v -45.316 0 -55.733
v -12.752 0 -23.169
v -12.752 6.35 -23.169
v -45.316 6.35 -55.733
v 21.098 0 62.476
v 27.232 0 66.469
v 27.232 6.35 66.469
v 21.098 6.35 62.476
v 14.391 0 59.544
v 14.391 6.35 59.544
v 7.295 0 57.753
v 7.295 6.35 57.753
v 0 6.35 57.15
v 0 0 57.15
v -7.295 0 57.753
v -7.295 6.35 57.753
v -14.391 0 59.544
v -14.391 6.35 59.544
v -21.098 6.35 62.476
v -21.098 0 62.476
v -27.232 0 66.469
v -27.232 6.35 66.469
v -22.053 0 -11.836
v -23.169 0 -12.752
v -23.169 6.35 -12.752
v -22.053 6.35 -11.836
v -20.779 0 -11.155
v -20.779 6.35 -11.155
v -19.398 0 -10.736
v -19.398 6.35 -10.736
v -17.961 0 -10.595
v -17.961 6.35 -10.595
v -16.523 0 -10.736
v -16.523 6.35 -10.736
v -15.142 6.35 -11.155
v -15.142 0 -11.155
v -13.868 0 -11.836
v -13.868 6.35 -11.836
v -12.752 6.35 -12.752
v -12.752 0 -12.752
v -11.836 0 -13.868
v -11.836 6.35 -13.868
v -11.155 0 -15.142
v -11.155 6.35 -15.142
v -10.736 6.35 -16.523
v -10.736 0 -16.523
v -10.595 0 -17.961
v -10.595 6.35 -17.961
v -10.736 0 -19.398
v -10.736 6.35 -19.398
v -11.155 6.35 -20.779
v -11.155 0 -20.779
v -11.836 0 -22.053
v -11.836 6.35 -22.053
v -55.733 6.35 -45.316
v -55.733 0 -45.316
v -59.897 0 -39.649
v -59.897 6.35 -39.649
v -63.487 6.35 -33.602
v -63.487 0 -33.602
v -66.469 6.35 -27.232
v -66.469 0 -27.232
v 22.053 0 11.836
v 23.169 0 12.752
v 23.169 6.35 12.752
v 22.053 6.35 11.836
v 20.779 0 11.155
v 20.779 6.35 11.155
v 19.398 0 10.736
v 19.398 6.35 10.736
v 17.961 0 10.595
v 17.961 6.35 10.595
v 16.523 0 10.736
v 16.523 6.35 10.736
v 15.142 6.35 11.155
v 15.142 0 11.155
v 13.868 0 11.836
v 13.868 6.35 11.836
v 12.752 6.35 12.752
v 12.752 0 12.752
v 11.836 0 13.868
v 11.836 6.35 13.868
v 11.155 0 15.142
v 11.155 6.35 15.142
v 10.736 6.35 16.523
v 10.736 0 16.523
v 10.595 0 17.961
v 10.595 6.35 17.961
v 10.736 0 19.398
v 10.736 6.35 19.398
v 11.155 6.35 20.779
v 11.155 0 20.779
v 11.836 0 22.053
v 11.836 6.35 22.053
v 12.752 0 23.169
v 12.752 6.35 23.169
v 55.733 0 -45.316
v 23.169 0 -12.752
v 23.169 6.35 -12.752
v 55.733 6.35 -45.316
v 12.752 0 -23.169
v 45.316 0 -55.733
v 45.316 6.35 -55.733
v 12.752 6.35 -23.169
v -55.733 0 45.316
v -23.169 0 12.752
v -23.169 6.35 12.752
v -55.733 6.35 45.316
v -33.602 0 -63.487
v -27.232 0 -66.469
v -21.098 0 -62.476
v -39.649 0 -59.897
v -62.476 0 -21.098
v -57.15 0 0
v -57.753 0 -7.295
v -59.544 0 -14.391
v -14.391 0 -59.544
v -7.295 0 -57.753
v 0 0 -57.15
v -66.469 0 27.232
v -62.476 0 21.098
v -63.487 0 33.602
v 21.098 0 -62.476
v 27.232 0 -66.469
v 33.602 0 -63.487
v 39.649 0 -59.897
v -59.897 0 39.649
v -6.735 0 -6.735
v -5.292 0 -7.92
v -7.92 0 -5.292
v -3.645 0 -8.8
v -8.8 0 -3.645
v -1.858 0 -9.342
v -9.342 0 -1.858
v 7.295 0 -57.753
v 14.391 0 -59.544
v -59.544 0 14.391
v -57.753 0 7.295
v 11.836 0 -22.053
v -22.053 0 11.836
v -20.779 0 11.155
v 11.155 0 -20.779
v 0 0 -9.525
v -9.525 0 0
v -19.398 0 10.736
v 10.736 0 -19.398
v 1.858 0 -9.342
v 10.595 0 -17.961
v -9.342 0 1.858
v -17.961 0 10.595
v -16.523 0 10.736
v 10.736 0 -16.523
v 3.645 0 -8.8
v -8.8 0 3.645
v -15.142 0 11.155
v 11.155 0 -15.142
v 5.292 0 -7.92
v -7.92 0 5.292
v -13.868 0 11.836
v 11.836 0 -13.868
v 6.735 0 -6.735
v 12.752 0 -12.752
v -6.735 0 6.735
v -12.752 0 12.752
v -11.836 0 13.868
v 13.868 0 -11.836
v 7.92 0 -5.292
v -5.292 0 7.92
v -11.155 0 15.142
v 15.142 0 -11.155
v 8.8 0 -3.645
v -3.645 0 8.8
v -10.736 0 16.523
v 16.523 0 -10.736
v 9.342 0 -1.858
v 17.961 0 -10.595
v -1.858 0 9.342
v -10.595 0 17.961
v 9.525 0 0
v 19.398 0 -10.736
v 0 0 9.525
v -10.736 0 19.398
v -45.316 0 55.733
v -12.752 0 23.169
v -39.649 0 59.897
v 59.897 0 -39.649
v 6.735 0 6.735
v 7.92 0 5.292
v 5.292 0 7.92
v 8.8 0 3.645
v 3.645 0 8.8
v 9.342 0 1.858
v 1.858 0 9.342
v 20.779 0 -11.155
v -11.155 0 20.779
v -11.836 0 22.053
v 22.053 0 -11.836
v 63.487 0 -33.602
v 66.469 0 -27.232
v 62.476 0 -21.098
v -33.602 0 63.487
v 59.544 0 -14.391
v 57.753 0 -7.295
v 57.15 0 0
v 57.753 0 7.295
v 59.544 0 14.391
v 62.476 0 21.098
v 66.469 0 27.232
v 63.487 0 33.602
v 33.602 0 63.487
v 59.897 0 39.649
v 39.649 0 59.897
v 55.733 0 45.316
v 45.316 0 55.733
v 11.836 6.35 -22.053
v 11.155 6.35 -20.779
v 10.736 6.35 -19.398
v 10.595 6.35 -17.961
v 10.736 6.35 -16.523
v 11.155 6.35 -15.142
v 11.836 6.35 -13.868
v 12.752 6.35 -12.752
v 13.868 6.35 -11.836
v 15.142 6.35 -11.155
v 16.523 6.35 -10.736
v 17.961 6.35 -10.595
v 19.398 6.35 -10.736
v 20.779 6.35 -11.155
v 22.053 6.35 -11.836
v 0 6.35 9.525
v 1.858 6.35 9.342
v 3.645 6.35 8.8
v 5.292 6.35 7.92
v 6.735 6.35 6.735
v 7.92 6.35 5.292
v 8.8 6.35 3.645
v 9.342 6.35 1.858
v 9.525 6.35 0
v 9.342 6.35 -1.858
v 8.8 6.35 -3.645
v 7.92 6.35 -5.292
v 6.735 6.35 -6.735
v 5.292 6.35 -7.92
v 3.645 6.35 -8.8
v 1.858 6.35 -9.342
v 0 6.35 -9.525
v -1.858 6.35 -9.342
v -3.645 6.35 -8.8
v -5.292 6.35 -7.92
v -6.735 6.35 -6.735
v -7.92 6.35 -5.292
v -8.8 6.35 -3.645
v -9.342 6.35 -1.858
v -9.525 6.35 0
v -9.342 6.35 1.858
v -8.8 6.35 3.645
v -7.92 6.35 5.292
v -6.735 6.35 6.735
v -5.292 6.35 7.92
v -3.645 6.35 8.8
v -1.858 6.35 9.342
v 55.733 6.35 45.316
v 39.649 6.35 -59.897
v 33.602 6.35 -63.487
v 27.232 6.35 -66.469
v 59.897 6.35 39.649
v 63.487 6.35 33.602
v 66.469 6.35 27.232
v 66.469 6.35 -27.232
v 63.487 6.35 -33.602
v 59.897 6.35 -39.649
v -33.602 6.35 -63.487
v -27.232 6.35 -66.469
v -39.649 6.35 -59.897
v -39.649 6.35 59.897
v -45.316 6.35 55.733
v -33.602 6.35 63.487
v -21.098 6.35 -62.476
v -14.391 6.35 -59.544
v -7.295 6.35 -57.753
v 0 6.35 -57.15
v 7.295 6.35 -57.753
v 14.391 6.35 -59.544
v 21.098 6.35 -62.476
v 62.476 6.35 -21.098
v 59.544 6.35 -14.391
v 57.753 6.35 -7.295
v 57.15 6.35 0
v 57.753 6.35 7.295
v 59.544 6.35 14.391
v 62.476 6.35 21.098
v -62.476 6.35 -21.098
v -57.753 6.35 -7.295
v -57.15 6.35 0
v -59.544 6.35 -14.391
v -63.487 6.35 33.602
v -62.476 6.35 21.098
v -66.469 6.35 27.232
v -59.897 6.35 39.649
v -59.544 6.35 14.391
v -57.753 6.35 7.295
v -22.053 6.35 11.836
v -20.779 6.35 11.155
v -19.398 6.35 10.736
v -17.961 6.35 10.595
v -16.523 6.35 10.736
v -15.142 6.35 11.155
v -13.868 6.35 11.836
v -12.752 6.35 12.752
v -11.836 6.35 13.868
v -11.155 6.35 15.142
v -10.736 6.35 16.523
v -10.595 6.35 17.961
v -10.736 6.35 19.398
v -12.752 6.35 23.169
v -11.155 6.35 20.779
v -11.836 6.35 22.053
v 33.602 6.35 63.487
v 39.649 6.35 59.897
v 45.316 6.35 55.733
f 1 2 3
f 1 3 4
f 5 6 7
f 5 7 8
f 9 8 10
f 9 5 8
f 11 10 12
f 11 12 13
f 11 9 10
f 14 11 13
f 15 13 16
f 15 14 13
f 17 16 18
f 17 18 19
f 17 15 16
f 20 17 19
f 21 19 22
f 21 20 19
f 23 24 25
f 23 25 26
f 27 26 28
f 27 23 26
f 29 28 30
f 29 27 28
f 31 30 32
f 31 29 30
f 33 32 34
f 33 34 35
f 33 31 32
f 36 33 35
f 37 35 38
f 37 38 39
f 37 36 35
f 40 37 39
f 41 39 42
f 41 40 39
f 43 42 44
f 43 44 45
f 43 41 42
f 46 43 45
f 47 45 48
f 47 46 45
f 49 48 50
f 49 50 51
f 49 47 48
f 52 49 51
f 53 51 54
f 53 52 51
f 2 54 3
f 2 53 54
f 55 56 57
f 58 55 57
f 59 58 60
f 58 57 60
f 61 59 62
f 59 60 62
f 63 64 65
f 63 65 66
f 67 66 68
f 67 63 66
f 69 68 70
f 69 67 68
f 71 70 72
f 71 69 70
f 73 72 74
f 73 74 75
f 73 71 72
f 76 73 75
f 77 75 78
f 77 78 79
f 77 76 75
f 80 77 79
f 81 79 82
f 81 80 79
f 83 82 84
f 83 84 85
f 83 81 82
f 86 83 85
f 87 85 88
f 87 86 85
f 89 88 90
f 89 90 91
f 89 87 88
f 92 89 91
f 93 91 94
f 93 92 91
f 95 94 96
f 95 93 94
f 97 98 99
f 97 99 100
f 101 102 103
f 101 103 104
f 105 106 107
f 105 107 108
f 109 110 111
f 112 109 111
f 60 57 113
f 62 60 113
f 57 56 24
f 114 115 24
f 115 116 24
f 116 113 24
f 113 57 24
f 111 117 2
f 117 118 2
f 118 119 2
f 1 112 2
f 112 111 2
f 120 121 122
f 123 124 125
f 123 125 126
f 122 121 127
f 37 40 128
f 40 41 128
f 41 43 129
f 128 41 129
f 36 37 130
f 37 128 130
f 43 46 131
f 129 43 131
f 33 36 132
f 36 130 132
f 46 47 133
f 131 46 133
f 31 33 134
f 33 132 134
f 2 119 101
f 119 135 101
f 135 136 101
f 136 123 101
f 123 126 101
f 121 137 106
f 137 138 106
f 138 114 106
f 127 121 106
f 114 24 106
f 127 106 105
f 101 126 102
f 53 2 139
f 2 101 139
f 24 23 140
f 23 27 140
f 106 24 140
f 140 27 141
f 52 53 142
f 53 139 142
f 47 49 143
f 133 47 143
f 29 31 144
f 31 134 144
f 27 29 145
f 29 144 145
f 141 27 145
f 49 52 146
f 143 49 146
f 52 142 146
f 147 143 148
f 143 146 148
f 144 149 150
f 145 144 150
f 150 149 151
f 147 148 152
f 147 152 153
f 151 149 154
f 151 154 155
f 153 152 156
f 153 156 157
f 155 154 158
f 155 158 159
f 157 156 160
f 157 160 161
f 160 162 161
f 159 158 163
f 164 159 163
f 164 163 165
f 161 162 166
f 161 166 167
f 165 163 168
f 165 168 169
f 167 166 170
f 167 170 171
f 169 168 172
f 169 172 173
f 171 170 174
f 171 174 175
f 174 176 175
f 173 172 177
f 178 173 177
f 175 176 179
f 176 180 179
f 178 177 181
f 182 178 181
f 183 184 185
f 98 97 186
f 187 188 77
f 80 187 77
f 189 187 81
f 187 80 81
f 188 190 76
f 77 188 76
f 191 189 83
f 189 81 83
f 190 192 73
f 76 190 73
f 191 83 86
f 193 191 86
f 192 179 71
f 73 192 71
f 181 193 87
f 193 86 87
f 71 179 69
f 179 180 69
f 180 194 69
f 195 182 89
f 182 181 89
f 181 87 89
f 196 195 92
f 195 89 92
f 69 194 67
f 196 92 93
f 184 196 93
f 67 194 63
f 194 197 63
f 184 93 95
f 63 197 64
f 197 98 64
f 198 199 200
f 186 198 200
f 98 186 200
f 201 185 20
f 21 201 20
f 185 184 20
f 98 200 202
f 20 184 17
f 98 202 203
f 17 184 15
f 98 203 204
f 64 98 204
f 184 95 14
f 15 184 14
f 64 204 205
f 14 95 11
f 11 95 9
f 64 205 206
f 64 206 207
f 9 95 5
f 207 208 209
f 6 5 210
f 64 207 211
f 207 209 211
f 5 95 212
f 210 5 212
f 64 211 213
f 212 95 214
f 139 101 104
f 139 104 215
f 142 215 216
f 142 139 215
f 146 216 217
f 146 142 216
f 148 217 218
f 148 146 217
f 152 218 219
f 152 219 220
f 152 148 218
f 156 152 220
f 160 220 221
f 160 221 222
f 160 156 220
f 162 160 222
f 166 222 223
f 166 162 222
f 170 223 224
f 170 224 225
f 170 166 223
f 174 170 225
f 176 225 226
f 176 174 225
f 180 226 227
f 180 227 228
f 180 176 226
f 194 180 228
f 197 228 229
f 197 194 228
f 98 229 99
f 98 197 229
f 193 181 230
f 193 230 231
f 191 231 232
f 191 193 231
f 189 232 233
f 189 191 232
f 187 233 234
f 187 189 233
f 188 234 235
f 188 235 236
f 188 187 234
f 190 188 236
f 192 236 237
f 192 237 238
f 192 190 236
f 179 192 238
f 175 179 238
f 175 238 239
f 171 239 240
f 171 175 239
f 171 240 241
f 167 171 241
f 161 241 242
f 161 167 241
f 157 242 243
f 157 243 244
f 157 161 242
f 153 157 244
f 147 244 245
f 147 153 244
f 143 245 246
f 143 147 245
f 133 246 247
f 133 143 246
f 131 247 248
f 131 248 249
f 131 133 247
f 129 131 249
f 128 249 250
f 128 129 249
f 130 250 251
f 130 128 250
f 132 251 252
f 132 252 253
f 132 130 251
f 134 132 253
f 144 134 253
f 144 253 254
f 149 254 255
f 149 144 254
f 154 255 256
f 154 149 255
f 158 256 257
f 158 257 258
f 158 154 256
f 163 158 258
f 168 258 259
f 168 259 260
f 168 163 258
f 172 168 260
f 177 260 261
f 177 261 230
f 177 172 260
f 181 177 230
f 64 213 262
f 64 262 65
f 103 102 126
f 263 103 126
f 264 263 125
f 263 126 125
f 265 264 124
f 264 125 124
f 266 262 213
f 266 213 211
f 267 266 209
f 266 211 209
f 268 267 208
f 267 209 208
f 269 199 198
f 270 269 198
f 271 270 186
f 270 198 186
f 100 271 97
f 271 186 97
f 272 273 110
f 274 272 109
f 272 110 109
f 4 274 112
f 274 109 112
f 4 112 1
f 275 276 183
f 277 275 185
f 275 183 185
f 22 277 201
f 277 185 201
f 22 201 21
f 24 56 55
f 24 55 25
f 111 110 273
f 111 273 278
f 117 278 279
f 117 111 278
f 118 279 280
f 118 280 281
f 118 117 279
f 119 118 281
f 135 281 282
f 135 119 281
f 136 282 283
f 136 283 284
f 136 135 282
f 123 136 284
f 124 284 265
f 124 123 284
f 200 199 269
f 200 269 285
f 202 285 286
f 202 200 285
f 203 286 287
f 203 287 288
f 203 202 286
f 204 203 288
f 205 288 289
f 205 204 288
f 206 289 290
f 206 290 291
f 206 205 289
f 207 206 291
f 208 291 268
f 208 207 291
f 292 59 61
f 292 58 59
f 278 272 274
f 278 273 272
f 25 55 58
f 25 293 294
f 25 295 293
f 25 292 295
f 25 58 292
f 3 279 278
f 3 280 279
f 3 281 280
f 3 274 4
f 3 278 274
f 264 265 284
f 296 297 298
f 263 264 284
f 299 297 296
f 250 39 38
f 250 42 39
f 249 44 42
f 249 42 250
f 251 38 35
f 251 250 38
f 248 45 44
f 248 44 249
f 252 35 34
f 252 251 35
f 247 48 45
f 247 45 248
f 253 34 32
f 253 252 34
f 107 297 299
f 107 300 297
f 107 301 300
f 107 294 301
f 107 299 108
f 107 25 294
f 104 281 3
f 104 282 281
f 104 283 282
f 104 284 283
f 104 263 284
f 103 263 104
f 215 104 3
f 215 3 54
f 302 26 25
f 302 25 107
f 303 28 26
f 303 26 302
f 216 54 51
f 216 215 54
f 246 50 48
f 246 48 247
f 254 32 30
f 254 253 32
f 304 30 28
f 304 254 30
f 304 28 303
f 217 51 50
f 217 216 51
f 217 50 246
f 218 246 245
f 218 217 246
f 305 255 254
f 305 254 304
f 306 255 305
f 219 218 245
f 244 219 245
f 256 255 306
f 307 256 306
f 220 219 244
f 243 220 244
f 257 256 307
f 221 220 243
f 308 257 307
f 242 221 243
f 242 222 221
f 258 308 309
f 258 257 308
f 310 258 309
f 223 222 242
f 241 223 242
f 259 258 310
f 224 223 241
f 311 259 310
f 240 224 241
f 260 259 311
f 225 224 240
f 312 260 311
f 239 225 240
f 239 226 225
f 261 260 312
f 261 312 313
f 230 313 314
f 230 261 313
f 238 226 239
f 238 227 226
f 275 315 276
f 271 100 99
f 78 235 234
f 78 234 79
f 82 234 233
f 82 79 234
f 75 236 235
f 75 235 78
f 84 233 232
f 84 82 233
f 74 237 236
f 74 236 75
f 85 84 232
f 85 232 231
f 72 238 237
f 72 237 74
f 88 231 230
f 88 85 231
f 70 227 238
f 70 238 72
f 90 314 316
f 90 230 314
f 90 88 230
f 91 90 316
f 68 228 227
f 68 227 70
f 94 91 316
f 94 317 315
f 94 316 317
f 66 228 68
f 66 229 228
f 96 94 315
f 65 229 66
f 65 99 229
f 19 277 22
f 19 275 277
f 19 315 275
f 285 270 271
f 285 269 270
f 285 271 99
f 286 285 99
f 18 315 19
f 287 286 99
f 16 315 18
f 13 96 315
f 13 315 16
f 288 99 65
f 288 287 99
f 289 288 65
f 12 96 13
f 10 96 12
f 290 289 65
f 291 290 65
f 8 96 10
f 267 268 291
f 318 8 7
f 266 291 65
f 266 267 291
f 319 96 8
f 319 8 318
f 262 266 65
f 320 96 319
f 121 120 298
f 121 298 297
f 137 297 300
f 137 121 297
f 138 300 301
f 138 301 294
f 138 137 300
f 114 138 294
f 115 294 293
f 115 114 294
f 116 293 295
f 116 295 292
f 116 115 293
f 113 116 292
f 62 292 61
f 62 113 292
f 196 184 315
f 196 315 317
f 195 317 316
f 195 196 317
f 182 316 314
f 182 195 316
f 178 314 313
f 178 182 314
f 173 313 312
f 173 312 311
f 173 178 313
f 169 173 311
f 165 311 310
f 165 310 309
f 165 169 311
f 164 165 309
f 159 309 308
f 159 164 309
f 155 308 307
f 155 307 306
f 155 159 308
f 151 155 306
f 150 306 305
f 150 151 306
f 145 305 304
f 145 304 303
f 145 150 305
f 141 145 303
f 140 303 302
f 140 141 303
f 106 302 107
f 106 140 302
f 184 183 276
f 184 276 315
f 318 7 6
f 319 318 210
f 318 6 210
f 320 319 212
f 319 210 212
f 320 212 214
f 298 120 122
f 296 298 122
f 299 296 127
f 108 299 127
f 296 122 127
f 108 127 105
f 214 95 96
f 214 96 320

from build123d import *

# Parameters (mm, degrees)
SKETCH1_R           = 71.8312
SKETCH1_R_2         = 9.525
BOSS_EXTRUDE1_DEPTH = 6.35
CUT_EXTRUDE1_START  = -6.35
CUT_EXTRUDE1_DEPTH  = 6.35
CIRPATTERN1_COUNT   = 4


# Read off the part's stored shape, not the designer's step: Cut-Extrude1
with BuildPart() as part:
    # Sketch1 → Boss-Extrude1 (new body)
    with BuildSketch(Plane(origin=(0, 0, 0), x_dir=(1, 0, 0), z_dir=(0, 1, 0))):
        with Locations(Location((0, 0, 0), (0, 0, 270))):
            Circle(SKETCH1_R)
        with Locations(Location((0, 0, 0), (0, 0, 270))):
            Circle(SKETCH1_R_2, mode=Mode.SUBTRACT)
    extrude(amount=BOSS_EXTRUDE1_DEPTH)

    # Cut-Extrude1 outline → Cut-Extrude1 (cut)
    with BuildSketch(Plane(origin=(0, 6.35, 0), x_dir=(1, 0, 0), z_dir=(0, 1, 0)).offset(CUT_EXTRUDE1_START)):
        with BuildLine():
            ThreePointArc((-12.751963692, -23.169060792), (-12.751963692, -12.751963692), (-23.169060792, -12.751963692))
            Line((-23.169060792, -12.751963692), (-55.733113553, -45.316016453))
            ThreePointArc((-55.733113553, -45.316016453), (-50.792328621, -50.792328621), (-45.316016453, -55.733113553))
            Line((-45.316016453, -55.733113553), (-12.751963692, -23.169060792))
        make_face()
        with BuildLine():
            ThreePointArc((-66.4688917, 27.232475642), (-71.8312, 0), (-66.4688917, -27.232475642))
            ThreePointArc((-66.4688917, -27.232475642), (-57.15, 0), (-66.4688917, 27.232475642))
        make_face()
    cut_extrude1 = extrude(amount=CUT_EXTRUDE1_DEPTH, mode=Mode.SUBTRACT)

    # CirPattern1: Cut-Extrude1 ×4 about axis
    cirpattern1_axis = Axis((0, 0, 0), (0, 1, 0))
    for i in range(1, CIRPATTERN1_COUNT):
        add(cut_extrude1.rotate(cirpattern1_axis, i * 360 / CIRPATTERN1_COUNT), mode=Mode.SUBTRACT)


solid = part.part
